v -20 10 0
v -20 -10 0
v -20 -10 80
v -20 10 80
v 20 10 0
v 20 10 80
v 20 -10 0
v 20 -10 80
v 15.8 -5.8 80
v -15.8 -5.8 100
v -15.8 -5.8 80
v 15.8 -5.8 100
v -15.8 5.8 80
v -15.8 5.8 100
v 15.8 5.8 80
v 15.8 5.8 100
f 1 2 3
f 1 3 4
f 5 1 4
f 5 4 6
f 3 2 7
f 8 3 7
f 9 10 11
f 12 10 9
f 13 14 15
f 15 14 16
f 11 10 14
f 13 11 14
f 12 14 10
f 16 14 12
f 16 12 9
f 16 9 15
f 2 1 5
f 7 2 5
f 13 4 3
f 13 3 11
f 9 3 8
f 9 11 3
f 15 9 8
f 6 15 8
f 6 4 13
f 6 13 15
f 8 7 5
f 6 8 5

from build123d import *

# Parameters (mm, degrees)
SKETCH_3_W          = 40
SKETCH_3_H          = 20
EXTRUDE_3_DEPTH     = 100
SKETCH_4_W          = 40
SKETCH_4_H          = 20
SKETCH_4_W_2        = 31.6
SKETCH_4_H_2        = 11.6
CUT_EXTRUDE_1_DEPTH = 20


with BuildPart() as part:
    # 草图3 → 凸台-拉伸3 (new body)
    with BuildSketch(Plane.XY):
        Rectangle(SKETCH_3_W, SKETCH_3_H)
    extrude(amount=EXTRUDE_3_DEPTH)

    # 草图4 → 切除-拉伸1 (cut)
    with BuildSketch(Plane.XY.offset(100)):
        Rectangle(SKETCH_4_W, SKETCH_4_H)
        Rectangle(SKETCH_4_W_2, SKETCH_4_H_2, mode=Mode.SUBTRACT)
    extrude(amount=-CUT_EXTRUDE_1_DEPTH, mode=Mode.SUBTRACT)


solid = part.part
